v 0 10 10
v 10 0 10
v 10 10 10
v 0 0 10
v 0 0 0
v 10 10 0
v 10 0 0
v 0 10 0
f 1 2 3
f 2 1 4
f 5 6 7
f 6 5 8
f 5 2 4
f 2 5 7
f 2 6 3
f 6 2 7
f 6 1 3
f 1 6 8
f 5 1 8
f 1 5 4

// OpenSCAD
// CUBO DESPLAZADO

// ejercicio anterior moviendo el cubo 
// hacia una direccion conocida

cube([10,10,10],[0,0,10]);
